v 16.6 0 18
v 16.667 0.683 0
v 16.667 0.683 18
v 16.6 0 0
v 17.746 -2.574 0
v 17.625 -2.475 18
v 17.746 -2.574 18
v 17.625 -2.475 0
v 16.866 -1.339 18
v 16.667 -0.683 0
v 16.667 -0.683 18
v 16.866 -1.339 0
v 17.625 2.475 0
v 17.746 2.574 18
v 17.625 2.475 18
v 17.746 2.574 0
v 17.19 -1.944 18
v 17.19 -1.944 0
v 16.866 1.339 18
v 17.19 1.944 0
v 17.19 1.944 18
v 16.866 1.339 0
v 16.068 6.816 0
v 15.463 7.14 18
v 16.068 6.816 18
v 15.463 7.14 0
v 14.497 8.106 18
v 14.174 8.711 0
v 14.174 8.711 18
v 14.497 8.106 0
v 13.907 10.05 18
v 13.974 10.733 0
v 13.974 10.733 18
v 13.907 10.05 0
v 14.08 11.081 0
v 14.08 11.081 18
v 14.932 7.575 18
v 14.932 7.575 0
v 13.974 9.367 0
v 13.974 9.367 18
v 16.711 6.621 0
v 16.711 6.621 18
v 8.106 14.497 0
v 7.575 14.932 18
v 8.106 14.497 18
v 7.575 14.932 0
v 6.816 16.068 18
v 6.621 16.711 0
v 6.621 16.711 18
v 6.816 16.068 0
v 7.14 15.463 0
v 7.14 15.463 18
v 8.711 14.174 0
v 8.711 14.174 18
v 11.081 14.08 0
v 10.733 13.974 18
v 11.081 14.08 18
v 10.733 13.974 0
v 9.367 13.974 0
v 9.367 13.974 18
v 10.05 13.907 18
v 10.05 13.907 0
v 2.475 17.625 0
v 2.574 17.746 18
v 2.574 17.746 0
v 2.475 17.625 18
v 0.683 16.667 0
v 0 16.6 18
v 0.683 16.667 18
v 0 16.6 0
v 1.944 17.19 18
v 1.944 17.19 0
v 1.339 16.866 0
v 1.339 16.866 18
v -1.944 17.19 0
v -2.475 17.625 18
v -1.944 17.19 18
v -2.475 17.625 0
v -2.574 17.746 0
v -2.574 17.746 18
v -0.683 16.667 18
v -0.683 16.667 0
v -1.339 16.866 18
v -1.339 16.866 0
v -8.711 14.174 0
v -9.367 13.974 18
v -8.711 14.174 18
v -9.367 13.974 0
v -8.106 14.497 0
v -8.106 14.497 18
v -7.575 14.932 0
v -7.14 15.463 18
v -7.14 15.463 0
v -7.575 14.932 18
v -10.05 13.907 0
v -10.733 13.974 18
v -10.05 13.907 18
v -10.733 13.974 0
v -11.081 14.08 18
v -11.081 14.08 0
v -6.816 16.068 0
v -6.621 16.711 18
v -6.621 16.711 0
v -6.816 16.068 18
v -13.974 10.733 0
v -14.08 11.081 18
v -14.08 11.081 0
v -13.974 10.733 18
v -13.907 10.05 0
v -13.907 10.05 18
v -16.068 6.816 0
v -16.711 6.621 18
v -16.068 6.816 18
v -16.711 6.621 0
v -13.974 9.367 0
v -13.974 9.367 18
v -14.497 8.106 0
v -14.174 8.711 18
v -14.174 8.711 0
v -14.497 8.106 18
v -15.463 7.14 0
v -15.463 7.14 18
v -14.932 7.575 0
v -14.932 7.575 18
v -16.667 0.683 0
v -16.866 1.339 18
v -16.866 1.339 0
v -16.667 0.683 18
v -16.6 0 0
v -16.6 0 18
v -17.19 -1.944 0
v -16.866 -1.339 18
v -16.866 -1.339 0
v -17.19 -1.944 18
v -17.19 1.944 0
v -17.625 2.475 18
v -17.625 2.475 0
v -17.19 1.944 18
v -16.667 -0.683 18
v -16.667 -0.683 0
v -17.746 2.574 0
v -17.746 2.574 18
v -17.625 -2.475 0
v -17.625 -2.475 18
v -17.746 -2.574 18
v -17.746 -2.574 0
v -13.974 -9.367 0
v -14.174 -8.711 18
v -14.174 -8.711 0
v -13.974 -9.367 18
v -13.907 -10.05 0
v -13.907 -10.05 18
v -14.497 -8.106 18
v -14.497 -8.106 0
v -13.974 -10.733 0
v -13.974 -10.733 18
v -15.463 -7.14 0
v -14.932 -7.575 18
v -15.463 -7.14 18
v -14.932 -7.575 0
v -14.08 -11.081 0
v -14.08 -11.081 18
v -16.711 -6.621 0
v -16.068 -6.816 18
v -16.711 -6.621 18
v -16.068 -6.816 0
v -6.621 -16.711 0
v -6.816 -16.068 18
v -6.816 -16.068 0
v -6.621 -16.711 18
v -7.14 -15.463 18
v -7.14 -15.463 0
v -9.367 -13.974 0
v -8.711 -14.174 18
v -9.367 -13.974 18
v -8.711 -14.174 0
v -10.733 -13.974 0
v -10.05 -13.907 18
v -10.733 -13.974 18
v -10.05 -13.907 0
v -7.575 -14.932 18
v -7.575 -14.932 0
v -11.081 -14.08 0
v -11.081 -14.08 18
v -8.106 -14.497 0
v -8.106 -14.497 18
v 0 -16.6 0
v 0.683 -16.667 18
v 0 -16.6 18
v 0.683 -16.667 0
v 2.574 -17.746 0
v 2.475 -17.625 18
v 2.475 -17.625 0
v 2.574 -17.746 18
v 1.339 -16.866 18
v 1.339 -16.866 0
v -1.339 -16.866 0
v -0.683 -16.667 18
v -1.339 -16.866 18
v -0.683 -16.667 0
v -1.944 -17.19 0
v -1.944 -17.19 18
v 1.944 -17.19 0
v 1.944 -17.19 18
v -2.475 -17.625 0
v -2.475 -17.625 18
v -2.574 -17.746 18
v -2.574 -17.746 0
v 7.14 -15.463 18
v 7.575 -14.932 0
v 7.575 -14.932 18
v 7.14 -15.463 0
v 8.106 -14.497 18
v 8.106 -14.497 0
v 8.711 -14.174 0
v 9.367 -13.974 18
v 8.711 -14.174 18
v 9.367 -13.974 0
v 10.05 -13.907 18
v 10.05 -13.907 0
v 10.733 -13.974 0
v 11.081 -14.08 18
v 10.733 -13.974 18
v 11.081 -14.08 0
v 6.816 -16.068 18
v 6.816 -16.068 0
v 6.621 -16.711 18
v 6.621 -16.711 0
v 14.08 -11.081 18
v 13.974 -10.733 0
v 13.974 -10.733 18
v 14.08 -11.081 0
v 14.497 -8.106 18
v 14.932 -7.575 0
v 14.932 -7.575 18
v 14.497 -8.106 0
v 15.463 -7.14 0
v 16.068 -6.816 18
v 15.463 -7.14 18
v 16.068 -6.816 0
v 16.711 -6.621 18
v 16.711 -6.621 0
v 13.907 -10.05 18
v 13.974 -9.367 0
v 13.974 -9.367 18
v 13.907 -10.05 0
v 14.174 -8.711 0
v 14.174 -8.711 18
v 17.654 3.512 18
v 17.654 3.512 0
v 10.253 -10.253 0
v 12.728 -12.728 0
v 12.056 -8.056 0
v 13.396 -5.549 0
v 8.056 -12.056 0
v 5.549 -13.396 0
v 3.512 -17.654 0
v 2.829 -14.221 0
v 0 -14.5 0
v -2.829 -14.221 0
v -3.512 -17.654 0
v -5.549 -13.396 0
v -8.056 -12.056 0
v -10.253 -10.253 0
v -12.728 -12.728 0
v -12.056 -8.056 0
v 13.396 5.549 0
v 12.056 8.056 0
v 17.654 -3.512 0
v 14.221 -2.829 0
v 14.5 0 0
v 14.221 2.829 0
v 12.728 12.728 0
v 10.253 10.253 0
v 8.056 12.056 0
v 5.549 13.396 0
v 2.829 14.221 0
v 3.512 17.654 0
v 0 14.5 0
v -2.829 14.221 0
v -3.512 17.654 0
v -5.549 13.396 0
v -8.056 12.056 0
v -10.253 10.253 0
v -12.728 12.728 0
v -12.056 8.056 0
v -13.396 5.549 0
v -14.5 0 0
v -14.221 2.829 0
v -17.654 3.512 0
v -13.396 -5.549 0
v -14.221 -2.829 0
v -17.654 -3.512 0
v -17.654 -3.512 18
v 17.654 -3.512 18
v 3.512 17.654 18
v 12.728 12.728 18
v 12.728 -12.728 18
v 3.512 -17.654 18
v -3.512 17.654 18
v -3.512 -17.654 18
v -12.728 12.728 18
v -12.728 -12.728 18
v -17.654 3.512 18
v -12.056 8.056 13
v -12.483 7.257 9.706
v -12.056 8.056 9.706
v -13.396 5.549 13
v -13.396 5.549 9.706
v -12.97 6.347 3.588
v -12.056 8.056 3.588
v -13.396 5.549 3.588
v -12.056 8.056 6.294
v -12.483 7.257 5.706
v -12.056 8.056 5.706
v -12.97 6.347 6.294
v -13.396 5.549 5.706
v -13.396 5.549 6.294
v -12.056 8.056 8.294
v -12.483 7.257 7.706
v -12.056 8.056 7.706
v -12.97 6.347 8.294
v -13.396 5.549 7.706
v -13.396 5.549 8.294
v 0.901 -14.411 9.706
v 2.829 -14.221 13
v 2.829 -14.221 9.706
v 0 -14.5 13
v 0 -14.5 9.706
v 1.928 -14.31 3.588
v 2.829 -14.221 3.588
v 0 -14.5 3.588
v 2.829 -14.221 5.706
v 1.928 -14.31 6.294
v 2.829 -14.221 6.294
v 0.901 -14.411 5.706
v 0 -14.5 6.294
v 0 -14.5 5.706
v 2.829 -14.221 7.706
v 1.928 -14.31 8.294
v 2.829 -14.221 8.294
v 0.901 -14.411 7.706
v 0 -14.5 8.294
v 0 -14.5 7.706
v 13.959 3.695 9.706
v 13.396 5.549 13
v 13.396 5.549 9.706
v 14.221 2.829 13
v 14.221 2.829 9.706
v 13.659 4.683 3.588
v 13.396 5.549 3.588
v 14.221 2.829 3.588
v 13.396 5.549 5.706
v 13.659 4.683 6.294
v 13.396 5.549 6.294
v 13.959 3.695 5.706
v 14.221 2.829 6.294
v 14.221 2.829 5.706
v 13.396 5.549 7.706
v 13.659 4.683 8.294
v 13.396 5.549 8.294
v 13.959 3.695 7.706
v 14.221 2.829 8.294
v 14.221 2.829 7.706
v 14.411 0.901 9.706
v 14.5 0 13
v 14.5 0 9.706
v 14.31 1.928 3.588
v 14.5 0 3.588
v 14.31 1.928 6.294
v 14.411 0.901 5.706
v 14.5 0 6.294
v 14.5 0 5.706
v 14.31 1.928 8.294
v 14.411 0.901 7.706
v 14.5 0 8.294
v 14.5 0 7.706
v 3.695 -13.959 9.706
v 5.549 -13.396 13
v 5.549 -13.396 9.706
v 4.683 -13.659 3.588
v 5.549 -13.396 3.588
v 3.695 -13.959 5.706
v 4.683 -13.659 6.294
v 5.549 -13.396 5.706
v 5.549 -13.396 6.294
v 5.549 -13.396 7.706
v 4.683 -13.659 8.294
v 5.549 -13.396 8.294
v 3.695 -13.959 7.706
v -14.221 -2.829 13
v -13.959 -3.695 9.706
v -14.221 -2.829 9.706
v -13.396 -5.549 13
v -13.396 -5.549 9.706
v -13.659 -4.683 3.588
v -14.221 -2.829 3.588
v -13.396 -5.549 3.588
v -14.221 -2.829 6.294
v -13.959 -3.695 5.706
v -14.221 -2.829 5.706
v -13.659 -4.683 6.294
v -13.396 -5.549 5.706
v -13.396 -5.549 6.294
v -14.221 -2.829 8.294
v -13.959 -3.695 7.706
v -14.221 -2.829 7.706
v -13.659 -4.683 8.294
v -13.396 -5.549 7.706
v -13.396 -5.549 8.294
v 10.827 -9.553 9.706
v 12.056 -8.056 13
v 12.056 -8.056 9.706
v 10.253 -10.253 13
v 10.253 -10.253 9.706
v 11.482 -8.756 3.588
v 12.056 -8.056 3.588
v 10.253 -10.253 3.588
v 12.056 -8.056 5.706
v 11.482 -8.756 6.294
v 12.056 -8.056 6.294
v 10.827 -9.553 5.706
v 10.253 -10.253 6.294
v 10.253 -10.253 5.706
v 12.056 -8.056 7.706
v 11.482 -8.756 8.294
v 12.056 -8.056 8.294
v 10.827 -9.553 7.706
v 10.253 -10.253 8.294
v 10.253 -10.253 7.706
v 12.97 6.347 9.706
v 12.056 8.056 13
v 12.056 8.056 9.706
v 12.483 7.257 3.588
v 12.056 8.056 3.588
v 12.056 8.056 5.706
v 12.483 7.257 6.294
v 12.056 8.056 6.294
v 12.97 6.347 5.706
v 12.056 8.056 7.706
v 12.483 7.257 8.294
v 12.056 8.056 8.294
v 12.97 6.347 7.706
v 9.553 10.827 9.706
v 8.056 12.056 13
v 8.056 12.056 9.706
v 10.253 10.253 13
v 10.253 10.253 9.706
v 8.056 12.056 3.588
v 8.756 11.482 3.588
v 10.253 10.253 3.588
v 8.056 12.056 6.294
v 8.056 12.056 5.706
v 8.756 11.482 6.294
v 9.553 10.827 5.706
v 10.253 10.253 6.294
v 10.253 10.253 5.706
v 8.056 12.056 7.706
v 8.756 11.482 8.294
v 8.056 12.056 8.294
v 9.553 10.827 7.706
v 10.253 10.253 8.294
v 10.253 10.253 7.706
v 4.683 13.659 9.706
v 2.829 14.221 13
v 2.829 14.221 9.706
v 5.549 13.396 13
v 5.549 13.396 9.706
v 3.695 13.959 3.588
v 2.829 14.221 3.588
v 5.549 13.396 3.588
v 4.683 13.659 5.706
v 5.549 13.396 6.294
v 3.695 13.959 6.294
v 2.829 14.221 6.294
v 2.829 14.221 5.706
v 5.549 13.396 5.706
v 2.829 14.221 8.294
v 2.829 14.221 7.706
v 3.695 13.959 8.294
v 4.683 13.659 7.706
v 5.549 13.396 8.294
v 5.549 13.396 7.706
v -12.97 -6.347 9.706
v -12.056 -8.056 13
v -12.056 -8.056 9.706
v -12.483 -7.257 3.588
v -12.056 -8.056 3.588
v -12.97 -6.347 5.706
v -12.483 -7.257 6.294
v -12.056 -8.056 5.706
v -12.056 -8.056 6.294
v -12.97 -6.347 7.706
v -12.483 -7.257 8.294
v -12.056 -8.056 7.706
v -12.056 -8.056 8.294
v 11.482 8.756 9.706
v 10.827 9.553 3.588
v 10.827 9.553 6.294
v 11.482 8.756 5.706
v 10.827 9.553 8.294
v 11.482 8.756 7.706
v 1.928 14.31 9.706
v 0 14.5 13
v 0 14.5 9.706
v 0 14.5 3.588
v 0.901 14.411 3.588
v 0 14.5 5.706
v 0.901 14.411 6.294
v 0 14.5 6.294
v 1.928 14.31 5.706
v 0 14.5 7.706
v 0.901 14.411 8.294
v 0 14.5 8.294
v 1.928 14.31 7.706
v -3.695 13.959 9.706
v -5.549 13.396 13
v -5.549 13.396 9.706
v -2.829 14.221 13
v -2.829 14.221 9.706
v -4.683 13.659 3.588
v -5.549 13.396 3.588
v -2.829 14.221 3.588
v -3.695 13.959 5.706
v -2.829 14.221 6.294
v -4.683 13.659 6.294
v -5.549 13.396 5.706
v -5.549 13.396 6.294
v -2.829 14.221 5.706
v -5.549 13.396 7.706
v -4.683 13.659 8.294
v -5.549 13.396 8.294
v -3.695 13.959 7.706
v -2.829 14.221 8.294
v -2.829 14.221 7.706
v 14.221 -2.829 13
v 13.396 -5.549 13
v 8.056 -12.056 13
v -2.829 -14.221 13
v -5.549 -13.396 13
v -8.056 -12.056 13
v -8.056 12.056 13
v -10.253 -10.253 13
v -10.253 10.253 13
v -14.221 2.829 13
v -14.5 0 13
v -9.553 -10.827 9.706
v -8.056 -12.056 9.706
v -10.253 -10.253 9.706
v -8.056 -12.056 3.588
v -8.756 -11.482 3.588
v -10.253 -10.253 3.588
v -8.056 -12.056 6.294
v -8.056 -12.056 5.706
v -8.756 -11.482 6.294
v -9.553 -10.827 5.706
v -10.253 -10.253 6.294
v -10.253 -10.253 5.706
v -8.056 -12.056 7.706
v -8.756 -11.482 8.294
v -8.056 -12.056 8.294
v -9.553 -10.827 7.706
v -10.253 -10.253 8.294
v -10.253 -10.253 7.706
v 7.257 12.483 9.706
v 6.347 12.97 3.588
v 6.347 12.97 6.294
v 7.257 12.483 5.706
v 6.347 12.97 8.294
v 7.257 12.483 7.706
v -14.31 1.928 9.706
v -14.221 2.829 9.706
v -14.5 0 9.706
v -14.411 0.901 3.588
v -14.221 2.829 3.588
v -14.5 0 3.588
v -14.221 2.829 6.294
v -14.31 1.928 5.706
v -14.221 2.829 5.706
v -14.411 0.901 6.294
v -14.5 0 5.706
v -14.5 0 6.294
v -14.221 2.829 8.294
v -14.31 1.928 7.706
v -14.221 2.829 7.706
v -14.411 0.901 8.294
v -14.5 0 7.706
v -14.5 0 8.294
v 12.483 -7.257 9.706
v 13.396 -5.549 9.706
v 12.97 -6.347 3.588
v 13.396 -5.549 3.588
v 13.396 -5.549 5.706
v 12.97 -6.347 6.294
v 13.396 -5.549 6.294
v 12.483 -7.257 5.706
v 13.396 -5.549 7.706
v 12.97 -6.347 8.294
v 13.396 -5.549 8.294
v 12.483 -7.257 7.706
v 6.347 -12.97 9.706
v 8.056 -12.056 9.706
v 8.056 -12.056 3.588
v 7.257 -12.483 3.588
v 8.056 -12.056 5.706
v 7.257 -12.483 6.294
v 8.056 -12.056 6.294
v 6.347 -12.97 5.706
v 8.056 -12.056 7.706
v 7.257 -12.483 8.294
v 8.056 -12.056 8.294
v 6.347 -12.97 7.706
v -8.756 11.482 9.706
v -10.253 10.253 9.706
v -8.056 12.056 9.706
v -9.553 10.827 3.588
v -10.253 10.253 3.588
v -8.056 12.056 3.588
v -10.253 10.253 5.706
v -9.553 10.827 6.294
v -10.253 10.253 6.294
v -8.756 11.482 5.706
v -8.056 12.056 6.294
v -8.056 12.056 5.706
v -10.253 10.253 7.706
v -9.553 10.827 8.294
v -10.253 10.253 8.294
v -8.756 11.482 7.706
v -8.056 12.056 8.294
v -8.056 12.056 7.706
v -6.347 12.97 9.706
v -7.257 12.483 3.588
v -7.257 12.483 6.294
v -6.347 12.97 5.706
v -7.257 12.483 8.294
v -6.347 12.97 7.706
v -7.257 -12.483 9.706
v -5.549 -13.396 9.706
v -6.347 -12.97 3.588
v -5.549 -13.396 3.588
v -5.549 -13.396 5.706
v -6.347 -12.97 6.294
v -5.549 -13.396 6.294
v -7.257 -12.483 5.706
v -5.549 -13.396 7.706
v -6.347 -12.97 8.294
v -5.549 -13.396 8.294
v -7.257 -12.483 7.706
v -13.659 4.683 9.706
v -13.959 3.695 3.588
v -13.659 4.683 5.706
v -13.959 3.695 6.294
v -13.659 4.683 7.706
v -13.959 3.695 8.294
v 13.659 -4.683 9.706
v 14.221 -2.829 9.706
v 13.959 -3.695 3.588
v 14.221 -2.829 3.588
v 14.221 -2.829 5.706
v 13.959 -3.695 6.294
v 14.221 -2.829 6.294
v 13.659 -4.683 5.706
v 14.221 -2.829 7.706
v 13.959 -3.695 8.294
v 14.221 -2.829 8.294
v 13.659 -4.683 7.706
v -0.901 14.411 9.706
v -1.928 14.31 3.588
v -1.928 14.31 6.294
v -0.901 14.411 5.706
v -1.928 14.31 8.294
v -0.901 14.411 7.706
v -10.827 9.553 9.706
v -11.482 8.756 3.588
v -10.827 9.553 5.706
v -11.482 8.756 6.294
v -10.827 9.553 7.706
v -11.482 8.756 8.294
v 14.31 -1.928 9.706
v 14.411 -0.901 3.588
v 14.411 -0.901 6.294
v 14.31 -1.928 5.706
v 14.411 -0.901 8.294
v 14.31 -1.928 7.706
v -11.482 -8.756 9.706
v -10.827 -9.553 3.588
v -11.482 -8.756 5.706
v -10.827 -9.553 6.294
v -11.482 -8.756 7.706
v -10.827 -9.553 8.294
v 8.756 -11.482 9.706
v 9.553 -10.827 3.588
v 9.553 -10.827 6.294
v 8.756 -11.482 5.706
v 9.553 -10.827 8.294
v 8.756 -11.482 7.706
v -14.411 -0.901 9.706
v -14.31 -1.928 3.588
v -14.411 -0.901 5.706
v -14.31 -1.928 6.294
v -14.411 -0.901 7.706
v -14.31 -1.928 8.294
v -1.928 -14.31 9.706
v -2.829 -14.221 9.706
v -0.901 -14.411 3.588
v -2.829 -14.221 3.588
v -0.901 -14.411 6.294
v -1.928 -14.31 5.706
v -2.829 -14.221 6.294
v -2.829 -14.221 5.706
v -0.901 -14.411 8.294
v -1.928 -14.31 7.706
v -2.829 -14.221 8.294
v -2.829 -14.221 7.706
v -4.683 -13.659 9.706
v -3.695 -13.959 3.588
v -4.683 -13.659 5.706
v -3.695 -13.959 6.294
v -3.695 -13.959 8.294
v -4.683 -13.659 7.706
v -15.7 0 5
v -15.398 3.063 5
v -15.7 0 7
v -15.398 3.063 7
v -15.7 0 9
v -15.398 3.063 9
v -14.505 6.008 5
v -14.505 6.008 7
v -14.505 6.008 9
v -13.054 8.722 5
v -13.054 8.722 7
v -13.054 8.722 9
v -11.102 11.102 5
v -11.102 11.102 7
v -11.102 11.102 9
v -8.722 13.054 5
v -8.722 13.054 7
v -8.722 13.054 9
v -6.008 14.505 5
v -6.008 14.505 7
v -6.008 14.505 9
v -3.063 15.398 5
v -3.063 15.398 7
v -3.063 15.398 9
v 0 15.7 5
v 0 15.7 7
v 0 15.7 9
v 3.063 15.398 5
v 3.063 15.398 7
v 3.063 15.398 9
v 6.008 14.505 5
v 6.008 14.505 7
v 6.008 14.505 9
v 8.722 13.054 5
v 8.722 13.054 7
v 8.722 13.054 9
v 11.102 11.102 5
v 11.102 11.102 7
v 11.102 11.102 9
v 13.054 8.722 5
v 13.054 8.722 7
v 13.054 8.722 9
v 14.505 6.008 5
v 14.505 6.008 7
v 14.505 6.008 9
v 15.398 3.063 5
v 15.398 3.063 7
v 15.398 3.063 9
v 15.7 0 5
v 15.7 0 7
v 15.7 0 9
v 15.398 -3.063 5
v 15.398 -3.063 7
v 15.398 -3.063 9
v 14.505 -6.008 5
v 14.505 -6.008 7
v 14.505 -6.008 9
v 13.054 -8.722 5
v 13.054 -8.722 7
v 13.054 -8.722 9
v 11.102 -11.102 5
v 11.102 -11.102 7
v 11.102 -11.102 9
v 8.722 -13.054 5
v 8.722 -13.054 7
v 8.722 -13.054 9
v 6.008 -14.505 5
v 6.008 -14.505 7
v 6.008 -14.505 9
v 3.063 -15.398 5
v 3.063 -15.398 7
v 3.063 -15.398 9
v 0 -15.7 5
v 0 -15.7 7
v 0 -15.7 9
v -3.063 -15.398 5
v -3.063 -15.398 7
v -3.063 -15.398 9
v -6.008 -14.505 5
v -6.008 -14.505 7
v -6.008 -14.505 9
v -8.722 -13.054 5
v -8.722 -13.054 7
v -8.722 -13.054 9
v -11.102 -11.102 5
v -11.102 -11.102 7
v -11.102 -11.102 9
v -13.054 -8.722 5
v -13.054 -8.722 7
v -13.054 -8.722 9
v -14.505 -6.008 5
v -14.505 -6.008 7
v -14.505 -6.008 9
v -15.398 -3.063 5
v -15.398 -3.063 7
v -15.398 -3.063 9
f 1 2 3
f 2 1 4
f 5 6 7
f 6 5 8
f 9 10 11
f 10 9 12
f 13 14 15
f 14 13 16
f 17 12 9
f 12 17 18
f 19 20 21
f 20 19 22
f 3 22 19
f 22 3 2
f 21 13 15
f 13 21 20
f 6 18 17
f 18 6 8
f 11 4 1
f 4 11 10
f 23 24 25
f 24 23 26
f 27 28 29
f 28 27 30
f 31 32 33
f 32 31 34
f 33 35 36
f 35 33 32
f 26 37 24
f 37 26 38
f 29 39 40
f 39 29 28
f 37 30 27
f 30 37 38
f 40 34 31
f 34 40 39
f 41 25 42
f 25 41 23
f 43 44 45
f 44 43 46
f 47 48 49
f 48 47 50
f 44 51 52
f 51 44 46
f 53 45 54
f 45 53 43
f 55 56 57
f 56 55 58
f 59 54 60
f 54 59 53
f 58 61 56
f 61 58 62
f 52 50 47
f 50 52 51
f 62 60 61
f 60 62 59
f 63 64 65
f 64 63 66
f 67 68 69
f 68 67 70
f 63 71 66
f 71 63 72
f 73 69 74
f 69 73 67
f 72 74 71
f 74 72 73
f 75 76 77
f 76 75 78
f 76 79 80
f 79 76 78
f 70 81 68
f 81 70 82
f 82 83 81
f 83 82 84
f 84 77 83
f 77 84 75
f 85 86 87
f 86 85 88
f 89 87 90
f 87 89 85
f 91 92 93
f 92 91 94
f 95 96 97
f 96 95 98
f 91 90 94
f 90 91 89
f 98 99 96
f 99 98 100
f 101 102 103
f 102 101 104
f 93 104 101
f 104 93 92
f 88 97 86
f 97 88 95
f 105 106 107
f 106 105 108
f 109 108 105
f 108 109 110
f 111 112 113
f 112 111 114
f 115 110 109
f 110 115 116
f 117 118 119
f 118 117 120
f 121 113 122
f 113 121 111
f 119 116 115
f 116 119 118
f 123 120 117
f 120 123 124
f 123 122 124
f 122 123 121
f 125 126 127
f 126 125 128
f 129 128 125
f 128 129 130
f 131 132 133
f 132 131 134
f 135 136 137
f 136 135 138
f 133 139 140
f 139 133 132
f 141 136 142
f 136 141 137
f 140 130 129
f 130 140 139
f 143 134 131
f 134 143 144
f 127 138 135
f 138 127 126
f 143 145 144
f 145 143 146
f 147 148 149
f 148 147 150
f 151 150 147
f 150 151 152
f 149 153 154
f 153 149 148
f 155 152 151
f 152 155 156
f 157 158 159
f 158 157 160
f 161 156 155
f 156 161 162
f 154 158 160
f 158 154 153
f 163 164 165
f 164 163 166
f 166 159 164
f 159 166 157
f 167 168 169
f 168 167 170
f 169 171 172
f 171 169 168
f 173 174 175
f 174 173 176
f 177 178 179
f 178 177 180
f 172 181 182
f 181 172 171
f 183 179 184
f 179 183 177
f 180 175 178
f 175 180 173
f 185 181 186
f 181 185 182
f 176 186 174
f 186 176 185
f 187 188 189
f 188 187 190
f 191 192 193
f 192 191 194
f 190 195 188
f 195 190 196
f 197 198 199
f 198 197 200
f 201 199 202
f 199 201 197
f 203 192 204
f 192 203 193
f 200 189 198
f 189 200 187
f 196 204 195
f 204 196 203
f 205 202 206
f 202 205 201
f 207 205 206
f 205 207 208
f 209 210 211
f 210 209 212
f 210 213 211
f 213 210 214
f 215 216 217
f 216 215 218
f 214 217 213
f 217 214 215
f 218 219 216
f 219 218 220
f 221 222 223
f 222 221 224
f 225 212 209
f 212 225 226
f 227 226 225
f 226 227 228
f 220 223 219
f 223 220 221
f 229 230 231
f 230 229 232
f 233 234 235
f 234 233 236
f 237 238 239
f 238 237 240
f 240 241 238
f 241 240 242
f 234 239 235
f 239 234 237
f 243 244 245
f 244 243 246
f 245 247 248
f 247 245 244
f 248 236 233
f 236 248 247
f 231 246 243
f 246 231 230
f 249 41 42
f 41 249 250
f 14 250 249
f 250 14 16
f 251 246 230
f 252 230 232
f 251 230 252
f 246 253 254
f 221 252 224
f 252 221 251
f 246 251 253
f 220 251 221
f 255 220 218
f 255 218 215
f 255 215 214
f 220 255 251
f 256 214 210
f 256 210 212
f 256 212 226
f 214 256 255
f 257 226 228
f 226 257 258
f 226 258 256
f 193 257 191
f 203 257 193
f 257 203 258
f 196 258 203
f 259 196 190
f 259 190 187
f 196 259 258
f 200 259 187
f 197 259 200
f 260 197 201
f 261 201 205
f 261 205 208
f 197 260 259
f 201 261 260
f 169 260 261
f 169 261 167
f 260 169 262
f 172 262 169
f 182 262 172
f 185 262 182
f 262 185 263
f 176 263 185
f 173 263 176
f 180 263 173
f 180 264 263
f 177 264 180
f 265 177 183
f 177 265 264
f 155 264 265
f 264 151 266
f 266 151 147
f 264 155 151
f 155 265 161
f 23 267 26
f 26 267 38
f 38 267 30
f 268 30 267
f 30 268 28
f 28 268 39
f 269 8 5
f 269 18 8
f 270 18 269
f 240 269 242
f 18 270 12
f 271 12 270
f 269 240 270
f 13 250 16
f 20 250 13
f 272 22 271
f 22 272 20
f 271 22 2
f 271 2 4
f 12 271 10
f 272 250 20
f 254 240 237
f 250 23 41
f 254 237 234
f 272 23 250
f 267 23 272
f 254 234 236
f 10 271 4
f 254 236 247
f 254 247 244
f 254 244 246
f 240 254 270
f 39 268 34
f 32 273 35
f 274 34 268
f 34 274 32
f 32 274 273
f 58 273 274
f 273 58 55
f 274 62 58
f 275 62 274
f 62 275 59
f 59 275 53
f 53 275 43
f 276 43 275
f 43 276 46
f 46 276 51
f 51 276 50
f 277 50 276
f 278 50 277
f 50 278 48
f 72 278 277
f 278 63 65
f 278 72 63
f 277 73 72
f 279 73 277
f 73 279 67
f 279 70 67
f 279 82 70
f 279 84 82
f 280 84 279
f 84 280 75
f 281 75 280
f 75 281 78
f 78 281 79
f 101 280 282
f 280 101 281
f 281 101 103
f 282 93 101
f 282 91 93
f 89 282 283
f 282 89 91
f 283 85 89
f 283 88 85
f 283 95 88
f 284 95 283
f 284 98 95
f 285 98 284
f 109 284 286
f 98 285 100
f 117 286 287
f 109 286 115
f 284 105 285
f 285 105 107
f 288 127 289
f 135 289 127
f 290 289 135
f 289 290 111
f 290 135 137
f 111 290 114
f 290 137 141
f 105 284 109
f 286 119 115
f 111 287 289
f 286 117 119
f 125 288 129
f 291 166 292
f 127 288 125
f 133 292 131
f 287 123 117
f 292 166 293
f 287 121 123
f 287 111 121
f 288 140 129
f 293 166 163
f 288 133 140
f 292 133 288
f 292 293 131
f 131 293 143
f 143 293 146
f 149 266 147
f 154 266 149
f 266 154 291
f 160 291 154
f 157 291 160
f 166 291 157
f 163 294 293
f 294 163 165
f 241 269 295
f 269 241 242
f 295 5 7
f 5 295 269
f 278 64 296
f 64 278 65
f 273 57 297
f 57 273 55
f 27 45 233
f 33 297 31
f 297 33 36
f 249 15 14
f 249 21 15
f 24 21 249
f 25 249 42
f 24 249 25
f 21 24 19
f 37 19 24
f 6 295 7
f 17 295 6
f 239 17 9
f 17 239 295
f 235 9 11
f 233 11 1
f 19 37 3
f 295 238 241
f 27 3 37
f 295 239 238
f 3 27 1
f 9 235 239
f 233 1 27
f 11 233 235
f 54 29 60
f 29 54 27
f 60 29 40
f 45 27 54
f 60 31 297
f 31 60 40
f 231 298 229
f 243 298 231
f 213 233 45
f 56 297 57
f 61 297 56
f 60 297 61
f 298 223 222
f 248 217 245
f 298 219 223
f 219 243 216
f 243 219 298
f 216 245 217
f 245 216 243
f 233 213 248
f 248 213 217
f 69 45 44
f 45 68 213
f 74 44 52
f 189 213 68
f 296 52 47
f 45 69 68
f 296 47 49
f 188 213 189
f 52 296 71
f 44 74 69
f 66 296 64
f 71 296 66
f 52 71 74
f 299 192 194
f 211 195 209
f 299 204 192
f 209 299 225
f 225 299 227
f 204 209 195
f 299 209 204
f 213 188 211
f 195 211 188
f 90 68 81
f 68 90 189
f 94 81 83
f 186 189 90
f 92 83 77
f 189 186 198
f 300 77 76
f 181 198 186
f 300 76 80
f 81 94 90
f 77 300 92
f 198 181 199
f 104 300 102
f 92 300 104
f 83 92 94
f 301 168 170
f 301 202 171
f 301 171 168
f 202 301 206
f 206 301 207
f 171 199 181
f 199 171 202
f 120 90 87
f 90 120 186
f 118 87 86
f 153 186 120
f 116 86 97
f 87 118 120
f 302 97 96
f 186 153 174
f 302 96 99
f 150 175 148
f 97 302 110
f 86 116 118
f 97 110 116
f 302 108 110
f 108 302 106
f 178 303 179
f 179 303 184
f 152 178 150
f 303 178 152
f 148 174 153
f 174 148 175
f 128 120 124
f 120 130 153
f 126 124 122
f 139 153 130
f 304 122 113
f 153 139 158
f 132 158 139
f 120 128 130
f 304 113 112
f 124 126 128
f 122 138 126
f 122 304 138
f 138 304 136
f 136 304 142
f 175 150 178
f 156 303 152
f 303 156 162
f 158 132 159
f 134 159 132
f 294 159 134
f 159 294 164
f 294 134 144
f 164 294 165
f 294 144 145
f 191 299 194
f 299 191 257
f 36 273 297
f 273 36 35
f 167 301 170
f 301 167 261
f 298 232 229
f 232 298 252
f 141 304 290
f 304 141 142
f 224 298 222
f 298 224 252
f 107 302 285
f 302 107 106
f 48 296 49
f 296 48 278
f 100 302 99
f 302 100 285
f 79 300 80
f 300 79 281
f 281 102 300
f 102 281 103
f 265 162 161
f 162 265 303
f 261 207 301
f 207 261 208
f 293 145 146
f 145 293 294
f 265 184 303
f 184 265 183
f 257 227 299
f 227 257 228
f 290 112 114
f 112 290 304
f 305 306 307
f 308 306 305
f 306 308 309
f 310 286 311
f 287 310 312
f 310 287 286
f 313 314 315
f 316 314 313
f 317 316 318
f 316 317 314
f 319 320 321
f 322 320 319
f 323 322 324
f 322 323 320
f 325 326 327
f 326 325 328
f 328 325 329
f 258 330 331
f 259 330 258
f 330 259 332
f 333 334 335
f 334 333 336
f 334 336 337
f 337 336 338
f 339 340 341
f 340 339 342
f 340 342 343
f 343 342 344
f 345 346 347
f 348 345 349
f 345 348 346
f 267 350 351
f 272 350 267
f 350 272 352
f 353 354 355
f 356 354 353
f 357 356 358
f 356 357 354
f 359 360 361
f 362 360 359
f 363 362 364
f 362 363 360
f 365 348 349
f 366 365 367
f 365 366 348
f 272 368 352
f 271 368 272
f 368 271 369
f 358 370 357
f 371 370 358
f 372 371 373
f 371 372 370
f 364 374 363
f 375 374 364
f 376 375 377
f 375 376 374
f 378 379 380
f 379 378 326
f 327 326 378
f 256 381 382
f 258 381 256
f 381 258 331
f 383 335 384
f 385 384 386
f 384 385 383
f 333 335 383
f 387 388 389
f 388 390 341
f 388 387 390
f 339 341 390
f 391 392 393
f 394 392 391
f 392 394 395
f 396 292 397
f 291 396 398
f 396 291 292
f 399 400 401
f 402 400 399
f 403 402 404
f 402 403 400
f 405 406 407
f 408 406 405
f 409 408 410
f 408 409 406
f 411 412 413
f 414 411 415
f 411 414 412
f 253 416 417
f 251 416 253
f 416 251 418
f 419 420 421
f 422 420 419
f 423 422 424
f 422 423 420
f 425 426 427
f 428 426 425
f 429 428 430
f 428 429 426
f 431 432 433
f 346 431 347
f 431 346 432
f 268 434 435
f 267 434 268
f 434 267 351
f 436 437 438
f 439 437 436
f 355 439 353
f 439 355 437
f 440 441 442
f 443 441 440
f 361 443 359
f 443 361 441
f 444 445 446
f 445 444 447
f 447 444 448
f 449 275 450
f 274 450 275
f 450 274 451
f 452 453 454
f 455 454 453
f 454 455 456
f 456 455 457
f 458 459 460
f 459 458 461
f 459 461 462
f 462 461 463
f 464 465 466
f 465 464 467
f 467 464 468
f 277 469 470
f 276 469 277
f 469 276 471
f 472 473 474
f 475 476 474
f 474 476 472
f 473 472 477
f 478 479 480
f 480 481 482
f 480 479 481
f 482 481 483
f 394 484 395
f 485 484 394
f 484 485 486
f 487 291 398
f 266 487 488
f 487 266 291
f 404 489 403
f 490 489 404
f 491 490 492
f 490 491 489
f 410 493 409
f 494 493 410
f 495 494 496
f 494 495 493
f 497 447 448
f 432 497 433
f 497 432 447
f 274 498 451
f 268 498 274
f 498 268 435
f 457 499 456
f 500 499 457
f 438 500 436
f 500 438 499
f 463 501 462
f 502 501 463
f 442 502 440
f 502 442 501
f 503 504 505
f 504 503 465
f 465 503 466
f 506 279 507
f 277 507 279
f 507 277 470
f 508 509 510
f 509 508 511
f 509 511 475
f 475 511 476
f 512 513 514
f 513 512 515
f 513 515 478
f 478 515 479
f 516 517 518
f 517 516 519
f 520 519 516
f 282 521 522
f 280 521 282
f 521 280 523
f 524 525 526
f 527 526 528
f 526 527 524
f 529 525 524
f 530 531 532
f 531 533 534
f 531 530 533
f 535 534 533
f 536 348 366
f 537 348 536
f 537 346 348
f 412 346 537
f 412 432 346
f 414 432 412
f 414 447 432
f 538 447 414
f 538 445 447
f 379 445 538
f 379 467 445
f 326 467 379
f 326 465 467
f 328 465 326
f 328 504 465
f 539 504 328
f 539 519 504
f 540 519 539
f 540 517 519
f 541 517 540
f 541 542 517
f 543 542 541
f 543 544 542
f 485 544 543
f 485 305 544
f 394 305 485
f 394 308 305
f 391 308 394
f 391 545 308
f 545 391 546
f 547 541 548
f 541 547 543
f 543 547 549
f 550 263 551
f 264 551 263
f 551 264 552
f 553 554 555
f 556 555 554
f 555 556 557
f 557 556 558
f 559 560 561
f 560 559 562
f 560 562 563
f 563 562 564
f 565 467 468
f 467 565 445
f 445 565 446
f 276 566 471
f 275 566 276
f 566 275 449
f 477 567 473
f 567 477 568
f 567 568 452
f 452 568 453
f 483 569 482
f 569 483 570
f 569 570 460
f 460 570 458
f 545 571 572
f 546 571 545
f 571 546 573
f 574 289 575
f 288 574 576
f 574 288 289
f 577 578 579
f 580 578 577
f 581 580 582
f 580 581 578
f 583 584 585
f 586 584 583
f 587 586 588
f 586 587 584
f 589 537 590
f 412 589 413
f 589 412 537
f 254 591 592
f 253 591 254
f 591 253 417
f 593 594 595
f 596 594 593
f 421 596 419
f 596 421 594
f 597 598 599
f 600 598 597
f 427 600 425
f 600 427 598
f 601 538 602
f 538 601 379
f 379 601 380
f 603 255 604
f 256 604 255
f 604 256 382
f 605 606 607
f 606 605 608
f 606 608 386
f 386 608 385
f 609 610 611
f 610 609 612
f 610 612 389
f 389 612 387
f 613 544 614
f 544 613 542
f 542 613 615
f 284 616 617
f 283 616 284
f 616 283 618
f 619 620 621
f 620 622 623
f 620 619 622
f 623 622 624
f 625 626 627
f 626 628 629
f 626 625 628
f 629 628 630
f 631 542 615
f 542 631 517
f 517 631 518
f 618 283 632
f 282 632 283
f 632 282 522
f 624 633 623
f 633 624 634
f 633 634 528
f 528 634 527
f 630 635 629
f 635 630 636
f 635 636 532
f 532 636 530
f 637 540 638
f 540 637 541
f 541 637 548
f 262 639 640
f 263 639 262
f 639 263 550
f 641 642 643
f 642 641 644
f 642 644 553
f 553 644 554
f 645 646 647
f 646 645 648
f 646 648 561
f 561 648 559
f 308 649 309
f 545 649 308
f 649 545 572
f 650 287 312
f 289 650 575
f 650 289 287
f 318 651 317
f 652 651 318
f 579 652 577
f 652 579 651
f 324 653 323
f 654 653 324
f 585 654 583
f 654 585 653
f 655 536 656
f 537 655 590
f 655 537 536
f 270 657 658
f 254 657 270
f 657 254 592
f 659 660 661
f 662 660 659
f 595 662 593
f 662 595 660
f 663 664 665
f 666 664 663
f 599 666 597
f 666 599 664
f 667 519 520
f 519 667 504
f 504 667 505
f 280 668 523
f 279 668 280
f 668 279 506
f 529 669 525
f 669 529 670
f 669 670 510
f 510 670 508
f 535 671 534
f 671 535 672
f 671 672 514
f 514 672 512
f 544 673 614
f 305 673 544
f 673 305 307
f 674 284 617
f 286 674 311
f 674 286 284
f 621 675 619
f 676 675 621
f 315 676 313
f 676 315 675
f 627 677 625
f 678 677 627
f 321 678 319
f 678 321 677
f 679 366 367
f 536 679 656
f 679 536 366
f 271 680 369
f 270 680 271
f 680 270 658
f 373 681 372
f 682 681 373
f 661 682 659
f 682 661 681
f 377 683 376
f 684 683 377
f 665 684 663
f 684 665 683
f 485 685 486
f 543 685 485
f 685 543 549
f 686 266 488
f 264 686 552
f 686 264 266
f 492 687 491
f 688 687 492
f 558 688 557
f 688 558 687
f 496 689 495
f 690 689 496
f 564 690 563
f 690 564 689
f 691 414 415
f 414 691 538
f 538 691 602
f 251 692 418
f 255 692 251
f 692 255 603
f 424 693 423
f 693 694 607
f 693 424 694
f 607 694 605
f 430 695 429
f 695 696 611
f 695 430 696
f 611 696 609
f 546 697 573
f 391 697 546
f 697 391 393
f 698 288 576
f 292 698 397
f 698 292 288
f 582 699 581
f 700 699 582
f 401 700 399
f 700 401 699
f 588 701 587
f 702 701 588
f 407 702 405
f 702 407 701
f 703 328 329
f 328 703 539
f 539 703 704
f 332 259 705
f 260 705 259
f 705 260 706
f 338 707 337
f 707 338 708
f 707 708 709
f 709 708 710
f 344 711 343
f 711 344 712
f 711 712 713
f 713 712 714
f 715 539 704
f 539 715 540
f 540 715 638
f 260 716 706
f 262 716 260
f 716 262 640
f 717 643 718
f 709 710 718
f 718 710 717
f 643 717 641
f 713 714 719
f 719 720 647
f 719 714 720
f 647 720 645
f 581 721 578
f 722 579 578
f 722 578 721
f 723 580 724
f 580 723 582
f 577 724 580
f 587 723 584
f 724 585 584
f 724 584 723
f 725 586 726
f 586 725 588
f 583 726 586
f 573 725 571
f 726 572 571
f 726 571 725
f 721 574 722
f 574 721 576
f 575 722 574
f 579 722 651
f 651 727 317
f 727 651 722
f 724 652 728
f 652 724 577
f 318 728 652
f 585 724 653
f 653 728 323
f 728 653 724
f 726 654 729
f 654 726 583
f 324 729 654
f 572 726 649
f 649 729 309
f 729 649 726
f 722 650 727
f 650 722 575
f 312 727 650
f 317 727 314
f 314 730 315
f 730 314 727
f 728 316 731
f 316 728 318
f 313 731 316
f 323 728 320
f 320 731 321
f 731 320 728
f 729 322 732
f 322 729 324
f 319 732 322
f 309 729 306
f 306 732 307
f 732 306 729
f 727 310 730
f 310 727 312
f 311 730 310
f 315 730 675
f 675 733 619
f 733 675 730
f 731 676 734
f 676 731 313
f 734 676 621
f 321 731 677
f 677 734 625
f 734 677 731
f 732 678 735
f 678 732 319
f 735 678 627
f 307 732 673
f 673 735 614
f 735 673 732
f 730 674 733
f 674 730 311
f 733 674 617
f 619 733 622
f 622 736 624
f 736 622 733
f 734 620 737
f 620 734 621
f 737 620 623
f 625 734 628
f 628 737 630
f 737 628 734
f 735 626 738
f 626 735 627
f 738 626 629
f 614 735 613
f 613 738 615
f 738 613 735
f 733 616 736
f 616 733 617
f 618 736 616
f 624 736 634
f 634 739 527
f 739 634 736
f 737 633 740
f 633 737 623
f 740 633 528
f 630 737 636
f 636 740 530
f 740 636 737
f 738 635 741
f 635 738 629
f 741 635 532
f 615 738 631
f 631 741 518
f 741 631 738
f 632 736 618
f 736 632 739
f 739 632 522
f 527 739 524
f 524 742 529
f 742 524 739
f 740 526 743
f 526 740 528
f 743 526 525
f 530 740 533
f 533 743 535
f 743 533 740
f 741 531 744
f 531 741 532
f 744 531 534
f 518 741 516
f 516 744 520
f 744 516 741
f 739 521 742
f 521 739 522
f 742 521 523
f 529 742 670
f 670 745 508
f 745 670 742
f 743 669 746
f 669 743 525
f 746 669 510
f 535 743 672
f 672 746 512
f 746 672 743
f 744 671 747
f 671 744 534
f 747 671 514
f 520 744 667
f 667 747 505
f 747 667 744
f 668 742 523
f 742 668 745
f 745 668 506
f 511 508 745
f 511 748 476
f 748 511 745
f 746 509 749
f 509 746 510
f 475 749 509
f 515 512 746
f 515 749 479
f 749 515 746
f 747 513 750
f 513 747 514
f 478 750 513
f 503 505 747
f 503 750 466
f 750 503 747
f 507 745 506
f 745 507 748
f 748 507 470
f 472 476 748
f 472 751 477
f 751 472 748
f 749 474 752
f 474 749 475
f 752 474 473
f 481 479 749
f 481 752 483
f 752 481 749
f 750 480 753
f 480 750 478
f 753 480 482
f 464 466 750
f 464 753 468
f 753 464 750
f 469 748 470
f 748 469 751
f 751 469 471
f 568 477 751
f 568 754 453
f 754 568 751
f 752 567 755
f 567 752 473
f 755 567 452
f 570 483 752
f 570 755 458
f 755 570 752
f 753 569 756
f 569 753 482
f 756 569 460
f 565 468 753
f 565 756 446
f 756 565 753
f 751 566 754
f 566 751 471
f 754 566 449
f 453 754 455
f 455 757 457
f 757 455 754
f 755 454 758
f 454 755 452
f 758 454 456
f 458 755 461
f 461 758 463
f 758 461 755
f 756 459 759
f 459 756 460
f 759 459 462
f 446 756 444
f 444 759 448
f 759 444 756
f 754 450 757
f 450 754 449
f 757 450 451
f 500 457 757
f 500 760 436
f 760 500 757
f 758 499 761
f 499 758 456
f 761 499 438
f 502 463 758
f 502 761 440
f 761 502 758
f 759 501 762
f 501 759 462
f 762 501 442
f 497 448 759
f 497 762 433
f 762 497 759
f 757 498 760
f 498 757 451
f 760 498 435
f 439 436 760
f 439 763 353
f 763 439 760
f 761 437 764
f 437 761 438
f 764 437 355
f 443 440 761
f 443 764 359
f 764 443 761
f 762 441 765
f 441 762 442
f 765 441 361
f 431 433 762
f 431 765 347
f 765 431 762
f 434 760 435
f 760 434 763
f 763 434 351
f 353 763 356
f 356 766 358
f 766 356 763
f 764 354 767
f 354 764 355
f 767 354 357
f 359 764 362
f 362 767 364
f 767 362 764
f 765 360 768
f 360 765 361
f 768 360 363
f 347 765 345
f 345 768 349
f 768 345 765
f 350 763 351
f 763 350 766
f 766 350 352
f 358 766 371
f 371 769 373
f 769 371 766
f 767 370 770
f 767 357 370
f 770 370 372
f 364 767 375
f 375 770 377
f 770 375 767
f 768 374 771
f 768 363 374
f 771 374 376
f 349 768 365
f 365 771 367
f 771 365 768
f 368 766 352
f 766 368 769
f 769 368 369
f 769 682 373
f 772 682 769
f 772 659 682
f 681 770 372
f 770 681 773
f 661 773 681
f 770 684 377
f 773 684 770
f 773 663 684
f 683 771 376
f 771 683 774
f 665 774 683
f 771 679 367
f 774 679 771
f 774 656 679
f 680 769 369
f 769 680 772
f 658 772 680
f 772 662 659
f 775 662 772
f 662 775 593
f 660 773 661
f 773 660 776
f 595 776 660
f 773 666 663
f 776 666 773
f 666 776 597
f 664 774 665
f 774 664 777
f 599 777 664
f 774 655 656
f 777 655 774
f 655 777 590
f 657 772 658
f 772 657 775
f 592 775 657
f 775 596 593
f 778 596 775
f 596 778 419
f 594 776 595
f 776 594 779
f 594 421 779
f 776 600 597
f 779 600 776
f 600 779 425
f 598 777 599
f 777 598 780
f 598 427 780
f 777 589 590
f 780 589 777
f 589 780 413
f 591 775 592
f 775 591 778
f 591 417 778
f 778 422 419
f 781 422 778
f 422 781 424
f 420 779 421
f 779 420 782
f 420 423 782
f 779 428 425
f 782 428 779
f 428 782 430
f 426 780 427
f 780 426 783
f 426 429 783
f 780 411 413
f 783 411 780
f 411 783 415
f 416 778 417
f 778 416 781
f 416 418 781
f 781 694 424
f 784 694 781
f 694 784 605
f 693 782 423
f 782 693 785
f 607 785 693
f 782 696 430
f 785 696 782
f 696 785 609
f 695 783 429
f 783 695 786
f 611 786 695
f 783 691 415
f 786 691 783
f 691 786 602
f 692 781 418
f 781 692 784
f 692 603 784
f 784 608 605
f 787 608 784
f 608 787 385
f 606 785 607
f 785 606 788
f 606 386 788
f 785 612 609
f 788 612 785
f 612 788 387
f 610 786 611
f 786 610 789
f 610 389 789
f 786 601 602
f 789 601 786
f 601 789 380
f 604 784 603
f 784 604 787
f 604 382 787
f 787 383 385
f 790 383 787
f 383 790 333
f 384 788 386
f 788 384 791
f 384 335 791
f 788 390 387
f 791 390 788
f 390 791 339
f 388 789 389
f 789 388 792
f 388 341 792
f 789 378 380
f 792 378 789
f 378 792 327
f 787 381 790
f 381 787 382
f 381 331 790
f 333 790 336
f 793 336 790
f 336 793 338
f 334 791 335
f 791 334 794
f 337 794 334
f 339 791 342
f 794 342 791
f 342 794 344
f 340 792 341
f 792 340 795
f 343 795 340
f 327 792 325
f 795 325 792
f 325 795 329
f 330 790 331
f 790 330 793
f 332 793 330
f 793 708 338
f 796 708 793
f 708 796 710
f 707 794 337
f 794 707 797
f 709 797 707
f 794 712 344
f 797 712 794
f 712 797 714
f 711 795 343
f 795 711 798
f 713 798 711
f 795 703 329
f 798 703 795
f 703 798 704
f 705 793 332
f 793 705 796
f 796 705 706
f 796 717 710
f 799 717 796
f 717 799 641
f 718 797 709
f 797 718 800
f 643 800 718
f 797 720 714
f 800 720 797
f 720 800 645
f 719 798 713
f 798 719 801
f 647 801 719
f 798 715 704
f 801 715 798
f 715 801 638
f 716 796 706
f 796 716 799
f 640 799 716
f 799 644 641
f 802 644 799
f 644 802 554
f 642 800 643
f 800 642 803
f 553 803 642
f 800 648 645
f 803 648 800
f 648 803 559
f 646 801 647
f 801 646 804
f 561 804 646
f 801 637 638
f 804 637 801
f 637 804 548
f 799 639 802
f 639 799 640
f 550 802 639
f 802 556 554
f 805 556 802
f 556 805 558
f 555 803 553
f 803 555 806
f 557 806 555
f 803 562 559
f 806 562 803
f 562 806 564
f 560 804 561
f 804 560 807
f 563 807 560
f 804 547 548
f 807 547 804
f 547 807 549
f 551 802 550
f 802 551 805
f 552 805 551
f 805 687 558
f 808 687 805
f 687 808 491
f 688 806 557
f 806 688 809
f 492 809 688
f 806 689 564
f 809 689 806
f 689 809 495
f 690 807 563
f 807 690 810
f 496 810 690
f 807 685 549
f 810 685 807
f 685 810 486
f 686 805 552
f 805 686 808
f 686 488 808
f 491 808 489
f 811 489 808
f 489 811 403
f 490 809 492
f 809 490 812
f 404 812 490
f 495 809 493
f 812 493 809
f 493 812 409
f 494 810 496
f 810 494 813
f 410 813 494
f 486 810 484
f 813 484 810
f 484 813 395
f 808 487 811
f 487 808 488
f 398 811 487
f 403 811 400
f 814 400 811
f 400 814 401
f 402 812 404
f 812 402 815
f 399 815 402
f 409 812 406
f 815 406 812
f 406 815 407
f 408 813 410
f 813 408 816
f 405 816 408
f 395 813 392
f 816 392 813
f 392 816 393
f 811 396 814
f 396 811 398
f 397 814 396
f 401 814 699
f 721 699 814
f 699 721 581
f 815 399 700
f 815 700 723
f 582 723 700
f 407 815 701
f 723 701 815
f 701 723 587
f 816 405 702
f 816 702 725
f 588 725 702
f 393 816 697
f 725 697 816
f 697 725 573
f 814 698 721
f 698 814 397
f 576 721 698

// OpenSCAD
$fn = 32;

// ----------------------------------------------------------------------
// Threaded cap: 36 mm body, 18 mm tall, 29 mm threaded bore
// ----------------------------------------------------------------------

// --- parameters (mm) ---
outer_d = 36;             // cap outside diameter
body_h = 18;              // cap height
top_t = 5;                // closed top thickness
bore_d = 29;              // bore core diameter
pitch = 2;                // thread pitch
thread_d = 1.2;           // thread depth
thread_z = 3;             // thread start above the rim
thread_h = 7;             // threaded height
flutes = 12;              // number of knurl flutes
flute_d = 7;              // flute cutter diameter
flute_depth = 1.4;        // flute depth into the rim

difference() {
  union() {
    cylinder(h = 18, d = outer_d);
  }
  /* threaded bore, closed at the top */
  translate([0, 0, -2.5]) cylinder(h = 15.5, d = bore_d);
  translate([0, 0, 3]) rotate_extrude() polygon([[13.5, 0], [13.5, 7], [14, 7], [15.7, 6], [14, 5], [15.7, 4], [14, 3], [15.7, 2], [14, 0], [13.5, 0]]);
  /* knurl flutes around the rim */
  for (i = [0 : flutes - 1]) {
    a = i * 360 / flutes;
    translate([(outer_d / 2 + flute_d / 2 - flute_depth) * cos(a), (outer_d / 2 + flute_d / 2 - flute_depth) * sin(a), -2.5]) cylinder(h = body_h + 5, d = flute_d);
  }
}
